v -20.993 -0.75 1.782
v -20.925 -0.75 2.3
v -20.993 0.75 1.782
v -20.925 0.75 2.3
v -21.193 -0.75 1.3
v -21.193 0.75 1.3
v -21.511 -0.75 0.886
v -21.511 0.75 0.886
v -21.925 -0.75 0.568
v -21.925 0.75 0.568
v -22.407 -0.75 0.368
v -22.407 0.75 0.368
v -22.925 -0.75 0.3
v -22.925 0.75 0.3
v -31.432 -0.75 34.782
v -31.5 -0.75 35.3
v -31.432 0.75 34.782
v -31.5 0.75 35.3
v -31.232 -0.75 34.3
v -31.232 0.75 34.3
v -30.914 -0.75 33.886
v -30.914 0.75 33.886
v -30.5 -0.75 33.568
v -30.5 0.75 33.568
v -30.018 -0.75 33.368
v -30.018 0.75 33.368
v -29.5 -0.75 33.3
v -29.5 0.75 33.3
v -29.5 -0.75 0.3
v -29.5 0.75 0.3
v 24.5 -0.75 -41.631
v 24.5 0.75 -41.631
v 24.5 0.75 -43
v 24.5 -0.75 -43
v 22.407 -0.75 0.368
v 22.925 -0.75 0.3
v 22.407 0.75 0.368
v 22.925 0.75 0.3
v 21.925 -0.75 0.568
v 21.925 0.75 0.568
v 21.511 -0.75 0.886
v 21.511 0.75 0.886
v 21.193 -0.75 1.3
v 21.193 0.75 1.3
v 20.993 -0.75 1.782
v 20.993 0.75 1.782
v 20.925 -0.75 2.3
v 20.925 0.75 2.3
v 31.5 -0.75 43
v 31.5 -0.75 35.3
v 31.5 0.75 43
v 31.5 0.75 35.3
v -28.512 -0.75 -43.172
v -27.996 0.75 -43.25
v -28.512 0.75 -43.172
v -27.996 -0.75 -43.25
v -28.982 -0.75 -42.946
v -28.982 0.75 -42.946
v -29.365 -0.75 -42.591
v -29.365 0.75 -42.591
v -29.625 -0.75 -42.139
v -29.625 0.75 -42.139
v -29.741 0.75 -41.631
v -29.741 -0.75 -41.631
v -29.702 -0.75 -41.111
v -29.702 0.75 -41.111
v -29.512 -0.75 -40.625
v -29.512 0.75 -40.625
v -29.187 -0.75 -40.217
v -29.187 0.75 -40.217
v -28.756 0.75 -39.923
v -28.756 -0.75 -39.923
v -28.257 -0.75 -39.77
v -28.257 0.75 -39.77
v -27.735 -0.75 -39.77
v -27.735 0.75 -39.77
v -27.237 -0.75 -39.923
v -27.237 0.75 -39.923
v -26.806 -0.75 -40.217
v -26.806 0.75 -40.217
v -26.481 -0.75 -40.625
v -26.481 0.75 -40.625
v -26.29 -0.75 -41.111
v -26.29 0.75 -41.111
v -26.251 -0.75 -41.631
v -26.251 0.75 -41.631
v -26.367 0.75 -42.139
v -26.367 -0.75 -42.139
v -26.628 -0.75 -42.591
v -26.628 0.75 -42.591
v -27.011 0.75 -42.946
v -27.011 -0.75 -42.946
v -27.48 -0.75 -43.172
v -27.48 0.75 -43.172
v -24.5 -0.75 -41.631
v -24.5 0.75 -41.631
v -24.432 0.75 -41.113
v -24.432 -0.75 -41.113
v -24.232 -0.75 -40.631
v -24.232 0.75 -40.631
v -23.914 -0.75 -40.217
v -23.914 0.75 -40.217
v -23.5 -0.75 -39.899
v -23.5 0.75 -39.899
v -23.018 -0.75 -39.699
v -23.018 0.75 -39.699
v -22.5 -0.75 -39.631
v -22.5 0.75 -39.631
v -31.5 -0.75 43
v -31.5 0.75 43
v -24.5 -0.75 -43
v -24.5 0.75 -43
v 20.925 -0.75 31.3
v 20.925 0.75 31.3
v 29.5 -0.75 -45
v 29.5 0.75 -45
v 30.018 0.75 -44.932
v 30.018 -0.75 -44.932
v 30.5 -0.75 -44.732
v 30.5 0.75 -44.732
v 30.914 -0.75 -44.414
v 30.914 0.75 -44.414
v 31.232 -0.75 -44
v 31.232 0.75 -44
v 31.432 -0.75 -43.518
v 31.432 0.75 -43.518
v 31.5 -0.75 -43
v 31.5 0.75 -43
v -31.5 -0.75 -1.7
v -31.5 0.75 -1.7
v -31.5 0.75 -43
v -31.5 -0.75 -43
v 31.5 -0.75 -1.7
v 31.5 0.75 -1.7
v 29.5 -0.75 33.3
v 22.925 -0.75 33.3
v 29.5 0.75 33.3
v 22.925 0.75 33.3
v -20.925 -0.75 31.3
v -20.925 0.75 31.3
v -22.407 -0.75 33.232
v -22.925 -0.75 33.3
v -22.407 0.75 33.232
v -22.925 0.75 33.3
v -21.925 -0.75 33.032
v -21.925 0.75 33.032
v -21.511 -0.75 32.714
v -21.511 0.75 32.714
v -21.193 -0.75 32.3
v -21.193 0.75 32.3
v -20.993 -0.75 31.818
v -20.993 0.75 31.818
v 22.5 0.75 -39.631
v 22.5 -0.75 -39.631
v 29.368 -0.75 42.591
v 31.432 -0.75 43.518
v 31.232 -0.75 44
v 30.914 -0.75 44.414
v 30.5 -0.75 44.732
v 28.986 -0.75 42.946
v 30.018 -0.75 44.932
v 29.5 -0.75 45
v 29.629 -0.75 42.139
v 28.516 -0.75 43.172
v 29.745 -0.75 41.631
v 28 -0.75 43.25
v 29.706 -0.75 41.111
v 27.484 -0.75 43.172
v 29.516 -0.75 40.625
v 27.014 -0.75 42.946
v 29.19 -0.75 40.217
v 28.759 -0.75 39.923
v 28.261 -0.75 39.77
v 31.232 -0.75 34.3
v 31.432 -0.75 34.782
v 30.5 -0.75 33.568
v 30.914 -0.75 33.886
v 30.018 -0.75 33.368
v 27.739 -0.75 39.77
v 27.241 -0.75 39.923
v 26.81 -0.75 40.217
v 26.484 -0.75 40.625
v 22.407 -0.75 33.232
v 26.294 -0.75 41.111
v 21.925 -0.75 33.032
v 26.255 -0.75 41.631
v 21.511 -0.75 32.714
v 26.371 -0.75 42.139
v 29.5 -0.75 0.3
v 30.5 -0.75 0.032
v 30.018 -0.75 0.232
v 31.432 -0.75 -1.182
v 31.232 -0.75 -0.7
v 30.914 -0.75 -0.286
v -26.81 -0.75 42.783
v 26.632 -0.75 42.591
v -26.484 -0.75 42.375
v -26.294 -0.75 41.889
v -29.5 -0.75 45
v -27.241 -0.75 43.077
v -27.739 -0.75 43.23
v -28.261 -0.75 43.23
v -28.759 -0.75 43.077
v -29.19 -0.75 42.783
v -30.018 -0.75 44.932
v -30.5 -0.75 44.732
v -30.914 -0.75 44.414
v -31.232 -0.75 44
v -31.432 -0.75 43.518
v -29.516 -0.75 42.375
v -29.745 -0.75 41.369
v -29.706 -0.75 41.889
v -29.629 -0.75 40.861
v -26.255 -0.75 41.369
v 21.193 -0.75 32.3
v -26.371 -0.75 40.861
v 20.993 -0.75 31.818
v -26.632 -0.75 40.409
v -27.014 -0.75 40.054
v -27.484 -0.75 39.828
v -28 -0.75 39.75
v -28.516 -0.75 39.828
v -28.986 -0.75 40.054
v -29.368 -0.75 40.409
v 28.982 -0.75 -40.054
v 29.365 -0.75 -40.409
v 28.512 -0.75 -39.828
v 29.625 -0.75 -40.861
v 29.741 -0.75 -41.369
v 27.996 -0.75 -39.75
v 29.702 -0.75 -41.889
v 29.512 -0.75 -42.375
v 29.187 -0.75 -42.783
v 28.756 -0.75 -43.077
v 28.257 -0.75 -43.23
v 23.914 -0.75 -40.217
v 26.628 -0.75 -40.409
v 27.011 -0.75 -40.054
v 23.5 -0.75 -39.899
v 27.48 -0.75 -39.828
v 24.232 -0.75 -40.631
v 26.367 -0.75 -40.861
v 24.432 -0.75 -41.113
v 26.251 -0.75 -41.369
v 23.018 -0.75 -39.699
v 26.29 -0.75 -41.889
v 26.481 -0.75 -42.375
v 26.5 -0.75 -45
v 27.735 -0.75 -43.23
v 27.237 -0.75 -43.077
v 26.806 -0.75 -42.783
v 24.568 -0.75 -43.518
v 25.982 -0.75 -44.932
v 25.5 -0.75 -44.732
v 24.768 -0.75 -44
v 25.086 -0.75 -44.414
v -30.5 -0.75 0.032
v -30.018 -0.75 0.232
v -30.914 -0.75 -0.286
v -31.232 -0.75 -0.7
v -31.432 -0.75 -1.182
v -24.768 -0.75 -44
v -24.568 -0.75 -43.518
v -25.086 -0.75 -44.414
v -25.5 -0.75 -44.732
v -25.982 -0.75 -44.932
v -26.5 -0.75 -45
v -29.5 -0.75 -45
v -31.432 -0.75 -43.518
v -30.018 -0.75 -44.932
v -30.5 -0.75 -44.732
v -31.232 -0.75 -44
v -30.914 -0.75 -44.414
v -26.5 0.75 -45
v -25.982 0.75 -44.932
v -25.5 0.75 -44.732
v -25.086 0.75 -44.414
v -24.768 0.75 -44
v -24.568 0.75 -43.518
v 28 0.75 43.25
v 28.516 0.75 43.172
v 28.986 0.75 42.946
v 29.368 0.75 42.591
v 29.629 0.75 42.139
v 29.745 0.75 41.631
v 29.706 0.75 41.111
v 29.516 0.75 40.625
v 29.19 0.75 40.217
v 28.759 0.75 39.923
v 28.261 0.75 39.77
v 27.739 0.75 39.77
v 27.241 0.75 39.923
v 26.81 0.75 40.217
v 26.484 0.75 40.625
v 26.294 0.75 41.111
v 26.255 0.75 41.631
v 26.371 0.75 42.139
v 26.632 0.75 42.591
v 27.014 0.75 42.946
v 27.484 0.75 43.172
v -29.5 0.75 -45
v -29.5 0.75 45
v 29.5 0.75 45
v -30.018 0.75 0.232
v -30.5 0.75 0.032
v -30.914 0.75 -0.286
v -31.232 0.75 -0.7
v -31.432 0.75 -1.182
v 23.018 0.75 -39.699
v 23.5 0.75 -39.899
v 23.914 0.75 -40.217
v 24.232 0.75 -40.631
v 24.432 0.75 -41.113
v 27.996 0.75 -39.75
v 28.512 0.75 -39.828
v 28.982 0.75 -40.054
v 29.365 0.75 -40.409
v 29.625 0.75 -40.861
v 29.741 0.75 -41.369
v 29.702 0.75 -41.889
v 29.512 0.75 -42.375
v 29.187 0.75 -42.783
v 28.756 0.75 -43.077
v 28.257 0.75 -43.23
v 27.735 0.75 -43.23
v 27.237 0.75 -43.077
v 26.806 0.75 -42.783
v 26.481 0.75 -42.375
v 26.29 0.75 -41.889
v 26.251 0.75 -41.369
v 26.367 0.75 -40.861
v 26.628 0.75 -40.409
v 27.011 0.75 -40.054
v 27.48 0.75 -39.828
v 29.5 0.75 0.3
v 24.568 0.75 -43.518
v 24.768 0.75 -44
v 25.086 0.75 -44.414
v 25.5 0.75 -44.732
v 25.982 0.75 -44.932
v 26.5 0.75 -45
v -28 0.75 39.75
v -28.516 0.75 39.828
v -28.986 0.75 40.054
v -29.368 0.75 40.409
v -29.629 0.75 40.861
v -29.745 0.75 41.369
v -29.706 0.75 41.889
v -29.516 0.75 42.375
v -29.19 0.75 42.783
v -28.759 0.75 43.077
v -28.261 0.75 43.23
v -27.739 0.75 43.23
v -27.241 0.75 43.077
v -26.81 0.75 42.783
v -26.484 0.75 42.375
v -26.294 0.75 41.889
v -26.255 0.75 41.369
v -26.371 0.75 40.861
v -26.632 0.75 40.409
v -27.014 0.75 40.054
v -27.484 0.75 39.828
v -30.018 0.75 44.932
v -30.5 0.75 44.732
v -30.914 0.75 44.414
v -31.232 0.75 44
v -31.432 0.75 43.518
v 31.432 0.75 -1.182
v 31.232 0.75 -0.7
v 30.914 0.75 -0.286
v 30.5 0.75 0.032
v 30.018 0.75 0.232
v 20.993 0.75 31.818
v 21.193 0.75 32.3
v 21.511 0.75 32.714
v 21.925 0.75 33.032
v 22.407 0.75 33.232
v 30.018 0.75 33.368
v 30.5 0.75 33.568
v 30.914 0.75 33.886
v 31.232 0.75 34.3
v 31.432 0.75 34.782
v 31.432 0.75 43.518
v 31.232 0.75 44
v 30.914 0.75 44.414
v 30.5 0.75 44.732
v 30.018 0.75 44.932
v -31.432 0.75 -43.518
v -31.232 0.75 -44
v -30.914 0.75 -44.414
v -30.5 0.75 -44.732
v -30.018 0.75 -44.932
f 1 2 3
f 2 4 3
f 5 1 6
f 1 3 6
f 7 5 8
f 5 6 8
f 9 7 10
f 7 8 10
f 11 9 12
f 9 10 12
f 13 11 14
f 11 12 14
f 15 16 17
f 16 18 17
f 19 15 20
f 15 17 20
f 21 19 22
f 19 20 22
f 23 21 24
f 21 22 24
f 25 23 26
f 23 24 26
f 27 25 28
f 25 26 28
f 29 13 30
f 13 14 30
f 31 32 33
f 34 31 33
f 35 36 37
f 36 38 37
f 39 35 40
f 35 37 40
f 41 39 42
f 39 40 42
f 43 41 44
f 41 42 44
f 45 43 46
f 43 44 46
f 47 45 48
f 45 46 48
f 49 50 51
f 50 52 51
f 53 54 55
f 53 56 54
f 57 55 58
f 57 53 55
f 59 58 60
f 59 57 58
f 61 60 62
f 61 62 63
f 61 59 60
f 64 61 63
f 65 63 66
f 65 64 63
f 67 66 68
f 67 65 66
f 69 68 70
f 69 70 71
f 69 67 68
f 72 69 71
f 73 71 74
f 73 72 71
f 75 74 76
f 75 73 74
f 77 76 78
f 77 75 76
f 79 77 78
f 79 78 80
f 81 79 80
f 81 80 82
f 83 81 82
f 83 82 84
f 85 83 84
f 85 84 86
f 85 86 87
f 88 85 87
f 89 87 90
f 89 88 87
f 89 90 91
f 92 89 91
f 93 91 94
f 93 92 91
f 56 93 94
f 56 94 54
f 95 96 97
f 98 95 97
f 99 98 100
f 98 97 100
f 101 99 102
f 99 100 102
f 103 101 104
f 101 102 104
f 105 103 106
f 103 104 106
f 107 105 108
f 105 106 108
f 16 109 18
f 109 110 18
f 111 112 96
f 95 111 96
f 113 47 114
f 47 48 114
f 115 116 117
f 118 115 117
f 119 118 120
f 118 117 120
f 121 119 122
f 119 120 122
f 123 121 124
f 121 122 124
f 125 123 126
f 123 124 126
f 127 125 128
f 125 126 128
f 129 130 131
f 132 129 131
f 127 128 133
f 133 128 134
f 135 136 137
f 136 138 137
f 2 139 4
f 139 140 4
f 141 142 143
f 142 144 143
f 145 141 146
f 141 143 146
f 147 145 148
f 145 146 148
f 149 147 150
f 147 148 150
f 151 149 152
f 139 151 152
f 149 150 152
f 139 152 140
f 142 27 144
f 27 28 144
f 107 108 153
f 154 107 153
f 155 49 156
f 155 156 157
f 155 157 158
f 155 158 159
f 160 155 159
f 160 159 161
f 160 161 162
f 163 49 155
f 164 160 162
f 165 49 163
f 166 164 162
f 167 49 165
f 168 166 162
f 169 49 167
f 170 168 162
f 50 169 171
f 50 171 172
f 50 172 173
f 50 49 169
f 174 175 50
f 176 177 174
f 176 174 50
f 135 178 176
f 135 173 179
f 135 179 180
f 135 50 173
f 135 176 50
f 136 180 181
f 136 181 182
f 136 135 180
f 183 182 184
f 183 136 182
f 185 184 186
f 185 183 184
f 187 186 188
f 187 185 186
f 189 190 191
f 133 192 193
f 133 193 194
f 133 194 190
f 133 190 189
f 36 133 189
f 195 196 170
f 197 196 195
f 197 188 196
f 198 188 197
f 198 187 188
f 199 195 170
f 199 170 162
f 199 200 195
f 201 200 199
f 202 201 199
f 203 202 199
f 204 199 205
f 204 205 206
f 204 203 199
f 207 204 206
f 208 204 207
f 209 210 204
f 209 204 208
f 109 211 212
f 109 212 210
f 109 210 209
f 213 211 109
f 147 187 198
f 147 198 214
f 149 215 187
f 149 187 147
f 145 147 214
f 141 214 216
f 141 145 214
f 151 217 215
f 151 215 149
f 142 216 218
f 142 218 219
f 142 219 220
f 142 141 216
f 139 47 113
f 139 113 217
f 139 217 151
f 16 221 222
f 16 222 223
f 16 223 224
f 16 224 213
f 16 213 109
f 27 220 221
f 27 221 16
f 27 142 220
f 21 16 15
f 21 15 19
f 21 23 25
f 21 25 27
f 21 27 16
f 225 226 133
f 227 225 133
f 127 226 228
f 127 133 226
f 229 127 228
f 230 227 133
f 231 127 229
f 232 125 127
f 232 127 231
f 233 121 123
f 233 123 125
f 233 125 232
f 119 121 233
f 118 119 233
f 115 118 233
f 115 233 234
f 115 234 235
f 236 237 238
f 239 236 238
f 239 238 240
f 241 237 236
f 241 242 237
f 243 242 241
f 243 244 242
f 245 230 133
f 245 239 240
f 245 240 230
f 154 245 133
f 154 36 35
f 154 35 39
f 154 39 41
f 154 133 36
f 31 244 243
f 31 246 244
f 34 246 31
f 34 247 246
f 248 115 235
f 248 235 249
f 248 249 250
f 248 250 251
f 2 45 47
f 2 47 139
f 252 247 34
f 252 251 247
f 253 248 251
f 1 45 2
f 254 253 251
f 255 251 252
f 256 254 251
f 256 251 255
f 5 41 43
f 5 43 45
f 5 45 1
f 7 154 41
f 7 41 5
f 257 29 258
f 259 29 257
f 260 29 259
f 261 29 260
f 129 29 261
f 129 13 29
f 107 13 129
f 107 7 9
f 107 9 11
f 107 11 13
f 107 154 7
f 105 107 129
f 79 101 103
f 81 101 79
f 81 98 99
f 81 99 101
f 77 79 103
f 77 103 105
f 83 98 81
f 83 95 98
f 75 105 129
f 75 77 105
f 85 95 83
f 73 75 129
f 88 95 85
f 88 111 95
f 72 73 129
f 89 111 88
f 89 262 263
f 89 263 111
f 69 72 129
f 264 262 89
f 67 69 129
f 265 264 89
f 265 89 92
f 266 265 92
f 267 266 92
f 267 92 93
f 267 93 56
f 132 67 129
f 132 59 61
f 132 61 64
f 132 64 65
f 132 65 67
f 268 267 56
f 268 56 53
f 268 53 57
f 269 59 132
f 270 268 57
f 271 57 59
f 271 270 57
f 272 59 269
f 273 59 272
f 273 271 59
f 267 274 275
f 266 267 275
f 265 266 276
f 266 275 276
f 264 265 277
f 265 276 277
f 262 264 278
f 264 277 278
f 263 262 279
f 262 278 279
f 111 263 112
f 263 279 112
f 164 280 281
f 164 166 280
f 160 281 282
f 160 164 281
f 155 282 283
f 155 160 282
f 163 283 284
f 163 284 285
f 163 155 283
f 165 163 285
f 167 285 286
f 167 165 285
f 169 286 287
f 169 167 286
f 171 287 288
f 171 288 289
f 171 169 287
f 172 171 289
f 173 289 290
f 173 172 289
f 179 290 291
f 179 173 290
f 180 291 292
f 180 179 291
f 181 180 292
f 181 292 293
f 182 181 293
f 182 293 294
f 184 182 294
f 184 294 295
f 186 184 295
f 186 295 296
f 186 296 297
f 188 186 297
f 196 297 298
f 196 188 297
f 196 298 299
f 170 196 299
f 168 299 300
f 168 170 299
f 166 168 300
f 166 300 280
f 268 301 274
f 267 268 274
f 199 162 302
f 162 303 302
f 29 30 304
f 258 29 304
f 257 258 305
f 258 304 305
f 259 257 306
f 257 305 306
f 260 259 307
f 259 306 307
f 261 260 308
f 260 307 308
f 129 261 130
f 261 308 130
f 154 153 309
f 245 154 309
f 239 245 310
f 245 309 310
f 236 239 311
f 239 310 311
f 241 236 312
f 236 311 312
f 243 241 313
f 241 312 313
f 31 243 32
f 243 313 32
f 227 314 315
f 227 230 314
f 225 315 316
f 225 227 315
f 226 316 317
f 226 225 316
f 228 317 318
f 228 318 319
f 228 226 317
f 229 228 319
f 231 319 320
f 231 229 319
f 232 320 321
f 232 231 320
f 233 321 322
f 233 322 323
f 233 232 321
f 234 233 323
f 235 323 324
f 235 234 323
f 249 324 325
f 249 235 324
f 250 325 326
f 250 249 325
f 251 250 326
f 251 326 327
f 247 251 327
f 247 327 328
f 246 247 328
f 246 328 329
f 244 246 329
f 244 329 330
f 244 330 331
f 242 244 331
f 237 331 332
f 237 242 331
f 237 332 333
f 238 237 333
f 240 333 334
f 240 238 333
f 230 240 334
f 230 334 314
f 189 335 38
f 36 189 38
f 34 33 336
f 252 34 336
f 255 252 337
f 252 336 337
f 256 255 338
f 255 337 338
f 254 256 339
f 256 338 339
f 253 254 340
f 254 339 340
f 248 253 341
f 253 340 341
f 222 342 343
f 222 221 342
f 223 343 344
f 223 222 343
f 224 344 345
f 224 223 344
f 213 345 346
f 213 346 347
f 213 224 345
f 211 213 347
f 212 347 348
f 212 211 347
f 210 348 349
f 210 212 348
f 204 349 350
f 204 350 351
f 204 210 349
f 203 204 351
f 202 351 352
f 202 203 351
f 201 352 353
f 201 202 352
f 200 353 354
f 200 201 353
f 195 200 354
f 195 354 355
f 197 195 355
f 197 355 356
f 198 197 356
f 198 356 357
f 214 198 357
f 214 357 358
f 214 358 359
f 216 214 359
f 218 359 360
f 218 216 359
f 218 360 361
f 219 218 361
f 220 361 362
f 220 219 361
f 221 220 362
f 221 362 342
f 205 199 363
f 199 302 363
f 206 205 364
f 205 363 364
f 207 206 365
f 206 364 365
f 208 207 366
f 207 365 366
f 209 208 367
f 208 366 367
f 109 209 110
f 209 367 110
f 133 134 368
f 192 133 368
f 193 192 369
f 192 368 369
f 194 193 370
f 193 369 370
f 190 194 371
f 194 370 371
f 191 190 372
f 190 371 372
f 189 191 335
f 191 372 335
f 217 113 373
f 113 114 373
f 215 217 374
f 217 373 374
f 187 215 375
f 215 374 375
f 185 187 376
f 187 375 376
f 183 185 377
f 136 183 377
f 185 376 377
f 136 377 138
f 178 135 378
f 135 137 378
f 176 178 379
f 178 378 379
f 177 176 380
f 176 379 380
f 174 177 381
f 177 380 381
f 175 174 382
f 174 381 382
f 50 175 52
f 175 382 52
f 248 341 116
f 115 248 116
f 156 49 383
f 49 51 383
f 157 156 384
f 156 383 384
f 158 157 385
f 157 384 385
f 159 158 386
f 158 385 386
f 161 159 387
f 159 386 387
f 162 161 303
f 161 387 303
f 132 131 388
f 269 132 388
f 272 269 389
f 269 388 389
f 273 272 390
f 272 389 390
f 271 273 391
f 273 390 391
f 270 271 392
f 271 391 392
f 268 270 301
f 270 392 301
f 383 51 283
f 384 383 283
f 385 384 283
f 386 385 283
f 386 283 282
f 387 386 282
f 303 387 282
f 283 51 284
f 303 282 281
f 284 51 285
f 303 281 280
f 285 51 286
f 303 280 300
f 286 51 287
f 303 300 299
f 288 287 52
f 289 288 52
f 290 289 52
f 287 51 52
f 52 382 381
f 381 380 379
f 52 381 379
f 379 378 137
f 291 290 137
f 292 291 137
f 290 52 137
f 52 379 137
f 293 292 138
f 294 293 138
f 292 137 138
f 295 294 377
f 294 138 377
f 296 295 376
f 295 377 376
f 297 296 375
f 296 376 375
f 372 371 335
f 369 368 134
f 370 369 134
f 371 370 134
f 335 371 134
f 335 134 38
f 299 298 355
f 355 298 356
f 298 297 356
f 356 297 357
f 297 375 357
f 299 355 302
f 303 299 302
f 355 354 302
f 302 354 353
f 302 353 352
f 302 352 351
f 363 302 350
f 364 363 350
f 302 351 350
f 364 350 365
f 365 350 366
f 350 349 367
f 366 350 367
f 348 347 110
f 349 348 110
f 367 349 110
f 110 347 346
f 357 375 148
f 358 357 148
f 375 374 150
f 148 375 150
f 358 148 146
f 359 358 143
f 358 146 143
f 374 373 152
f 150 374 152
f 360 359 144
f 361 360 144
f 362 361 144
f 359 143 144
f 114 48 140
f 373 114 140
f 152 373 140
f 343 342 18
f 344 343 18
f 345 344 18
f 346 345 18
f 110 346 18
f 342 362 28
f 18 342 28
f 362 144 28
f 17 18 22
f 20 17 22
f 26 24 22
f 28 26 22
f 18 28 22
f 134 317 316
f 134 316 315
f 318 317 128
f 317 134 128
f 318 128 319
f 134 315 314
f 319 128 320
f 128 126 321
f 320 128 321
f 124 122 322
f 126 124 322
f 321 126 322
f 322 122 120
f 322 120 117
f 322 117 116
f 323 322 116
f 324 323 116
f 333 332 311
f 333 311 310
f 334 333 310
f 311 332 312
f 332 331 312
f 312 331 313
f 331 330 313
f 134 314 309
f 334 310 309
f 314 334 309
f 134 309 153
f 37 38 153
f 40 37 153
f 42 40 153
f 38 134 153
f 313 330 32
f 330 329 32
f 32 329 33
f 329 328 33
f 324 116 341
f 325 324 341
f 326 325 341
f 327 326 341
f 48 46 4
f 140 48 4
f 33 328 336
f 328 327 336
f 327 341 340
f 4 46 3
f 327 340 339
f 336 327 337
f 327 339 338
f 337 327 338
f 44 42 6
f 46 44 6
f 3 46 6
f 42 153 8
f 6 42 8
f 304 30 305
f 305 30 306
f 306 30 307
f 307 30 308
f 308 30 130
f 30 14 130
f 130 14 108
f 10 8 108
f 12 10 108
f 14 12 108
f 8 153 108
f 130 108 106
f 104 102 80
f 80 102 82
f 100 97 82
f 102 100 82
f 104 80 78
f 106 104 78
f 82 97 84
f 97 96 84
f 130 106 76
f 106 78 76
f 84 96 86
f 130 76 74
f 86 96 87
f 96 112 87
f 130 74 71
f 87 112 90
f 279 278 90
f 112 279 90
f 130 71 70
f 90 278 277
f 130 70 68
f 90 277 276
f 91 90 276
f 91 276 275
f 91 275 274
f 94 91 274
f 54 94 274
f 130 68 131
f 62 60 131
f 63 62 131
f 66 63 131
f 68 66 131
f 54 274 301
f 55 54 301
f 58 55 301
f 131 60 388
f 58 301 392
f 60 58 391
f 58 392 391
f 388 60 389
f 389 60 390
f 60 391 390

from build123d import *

# Parameters (mm, degrees)
SKETCH1_R           = 1.75
BOSS_EXTRUDE1_DEPTH = 0.75


with BuildPart() as part:
    # Sketch1 → Boss-Extrude1 (new, symmetric)
    with BuildSketch(Plane(origin=(0, 0, 0), x_dir=(1, 0, 0), z_dir=(0, 1, 0))):
        with BuildLine():
            Line((29.5, -0.3), (22.925, -0.3))
            ThreePointArc((22.925, -0.3), (21.510786438, -0.885786438), (20.925, -2.3))
            Line((20.925, -2.3), (20.925, -31.3))
            ThreePointArc((20.925, -31.3), (21.510786438, -32.714213562), (22.925, -33.3))
            Line((22.925, -33.3), (29.5, -33.3))
            ThreePointArc((29.5, -33.3), (30.914213562, -33.885786438), (31.5, -35.3))
            Line((31.5, -35.3), (31.5, -43))
            ThreePointArc((31.5, -43), (30.914213562, -44.414213562), (29.5, -45))
            Line((29.5, -45), (-29.5, -45))
            ThreePointArc((-29.5, -45), (-30.914213562, -44.414213562), (-31.5, -43))
            Line((-31.5, -43), (-31.5, -35.3))
            ThreePointArc((-31.5, -35.3), (-30.914213562, -33.885786438), (-29.5, -33.3))
            Line((-29.5, -33.3), (-22.925, -33.3))
            ThreePointArc((-22.925, -33.3), (-21.510786438, -32.714213562), (-20.925, -31.3))
            Line((-20.925, -31.3), (-20.925, -2.3))
            ThreePointArc((-20.925, -2.3), (-21.510786438, -0.885786438), (-22.925, -0.3))
            Line((-22.925, -0.3), (-29.5, -0.3))
            ThreePointArc((-29.5, -0.3), (-30.914213562, 0.285786438), (-31.5, 1.7))
            Line((-31.5, 1.7), (-31.5, 43))
            ThreePointArc((-31.5, 43), (-30.914213562, 44.414213562), (-29.5, 45))
            Line((-29.5, 45), (-26.5, 45))
            ThreePointArc((-26.5, 45), (-25.085786438, 44.414213562), (-24.5, 43))
            Line((-24.5, 43), (-24.5, 41.631016383))
            ThreePointArc((-24.5, 41.631016383), (-23.914213562, 40.216802821), (-22.5, 39.631016383))
            Line((-22.5, 39.631016383), (22.5, 39.631016383))
            ThreePointArc((22.5, 39.631016383), (23.914213562, 40.216802821), (24.5, 41.631016383))
            Line((24.5, 41.631016383), (24.5, 43))
            ThreePointArc((24.5, 43), (25.085786438, 44.414213562), (26.5, 45))
            Line((26.5, 45), (29.5, 45))
            ThreePointArc((29.5, 45), (30.914213562, 44.414213562), (31.5, 43))
            Line((31.5, 43), (31.5, 1.7))
            ThreePointArc((31.5, 1.7), (30.914213562, 0.285786438), (29.5, -0.3))
        make_face()
        with Locations(Location((27.996318987, 41.5, 0), (0, 0, 270))):
            Circle(SKETCH1_R, mode=Mode.SUBTRACT)
        with Locations(Location((-27.996318987, 41.5, 0), (0, 0, 90))):
            Circle(SKETCH1_R, mode=Mode.SUBTRACT)
        with Locations(Location((28, -41.5, 0), (0, 0, 270))):
            Circle(SKETCH1_R, mode=Mode.SUBTRACT)
        with Locations(Location((-28, -41.5, 0), (0, 0, 90))):
            Circle(SKETCH1_R, mode=Mode.SUBTRACT)
    extrude(amount=BOSS_EXTRUDE1_DEPTH, both=True)


solid = part.part
